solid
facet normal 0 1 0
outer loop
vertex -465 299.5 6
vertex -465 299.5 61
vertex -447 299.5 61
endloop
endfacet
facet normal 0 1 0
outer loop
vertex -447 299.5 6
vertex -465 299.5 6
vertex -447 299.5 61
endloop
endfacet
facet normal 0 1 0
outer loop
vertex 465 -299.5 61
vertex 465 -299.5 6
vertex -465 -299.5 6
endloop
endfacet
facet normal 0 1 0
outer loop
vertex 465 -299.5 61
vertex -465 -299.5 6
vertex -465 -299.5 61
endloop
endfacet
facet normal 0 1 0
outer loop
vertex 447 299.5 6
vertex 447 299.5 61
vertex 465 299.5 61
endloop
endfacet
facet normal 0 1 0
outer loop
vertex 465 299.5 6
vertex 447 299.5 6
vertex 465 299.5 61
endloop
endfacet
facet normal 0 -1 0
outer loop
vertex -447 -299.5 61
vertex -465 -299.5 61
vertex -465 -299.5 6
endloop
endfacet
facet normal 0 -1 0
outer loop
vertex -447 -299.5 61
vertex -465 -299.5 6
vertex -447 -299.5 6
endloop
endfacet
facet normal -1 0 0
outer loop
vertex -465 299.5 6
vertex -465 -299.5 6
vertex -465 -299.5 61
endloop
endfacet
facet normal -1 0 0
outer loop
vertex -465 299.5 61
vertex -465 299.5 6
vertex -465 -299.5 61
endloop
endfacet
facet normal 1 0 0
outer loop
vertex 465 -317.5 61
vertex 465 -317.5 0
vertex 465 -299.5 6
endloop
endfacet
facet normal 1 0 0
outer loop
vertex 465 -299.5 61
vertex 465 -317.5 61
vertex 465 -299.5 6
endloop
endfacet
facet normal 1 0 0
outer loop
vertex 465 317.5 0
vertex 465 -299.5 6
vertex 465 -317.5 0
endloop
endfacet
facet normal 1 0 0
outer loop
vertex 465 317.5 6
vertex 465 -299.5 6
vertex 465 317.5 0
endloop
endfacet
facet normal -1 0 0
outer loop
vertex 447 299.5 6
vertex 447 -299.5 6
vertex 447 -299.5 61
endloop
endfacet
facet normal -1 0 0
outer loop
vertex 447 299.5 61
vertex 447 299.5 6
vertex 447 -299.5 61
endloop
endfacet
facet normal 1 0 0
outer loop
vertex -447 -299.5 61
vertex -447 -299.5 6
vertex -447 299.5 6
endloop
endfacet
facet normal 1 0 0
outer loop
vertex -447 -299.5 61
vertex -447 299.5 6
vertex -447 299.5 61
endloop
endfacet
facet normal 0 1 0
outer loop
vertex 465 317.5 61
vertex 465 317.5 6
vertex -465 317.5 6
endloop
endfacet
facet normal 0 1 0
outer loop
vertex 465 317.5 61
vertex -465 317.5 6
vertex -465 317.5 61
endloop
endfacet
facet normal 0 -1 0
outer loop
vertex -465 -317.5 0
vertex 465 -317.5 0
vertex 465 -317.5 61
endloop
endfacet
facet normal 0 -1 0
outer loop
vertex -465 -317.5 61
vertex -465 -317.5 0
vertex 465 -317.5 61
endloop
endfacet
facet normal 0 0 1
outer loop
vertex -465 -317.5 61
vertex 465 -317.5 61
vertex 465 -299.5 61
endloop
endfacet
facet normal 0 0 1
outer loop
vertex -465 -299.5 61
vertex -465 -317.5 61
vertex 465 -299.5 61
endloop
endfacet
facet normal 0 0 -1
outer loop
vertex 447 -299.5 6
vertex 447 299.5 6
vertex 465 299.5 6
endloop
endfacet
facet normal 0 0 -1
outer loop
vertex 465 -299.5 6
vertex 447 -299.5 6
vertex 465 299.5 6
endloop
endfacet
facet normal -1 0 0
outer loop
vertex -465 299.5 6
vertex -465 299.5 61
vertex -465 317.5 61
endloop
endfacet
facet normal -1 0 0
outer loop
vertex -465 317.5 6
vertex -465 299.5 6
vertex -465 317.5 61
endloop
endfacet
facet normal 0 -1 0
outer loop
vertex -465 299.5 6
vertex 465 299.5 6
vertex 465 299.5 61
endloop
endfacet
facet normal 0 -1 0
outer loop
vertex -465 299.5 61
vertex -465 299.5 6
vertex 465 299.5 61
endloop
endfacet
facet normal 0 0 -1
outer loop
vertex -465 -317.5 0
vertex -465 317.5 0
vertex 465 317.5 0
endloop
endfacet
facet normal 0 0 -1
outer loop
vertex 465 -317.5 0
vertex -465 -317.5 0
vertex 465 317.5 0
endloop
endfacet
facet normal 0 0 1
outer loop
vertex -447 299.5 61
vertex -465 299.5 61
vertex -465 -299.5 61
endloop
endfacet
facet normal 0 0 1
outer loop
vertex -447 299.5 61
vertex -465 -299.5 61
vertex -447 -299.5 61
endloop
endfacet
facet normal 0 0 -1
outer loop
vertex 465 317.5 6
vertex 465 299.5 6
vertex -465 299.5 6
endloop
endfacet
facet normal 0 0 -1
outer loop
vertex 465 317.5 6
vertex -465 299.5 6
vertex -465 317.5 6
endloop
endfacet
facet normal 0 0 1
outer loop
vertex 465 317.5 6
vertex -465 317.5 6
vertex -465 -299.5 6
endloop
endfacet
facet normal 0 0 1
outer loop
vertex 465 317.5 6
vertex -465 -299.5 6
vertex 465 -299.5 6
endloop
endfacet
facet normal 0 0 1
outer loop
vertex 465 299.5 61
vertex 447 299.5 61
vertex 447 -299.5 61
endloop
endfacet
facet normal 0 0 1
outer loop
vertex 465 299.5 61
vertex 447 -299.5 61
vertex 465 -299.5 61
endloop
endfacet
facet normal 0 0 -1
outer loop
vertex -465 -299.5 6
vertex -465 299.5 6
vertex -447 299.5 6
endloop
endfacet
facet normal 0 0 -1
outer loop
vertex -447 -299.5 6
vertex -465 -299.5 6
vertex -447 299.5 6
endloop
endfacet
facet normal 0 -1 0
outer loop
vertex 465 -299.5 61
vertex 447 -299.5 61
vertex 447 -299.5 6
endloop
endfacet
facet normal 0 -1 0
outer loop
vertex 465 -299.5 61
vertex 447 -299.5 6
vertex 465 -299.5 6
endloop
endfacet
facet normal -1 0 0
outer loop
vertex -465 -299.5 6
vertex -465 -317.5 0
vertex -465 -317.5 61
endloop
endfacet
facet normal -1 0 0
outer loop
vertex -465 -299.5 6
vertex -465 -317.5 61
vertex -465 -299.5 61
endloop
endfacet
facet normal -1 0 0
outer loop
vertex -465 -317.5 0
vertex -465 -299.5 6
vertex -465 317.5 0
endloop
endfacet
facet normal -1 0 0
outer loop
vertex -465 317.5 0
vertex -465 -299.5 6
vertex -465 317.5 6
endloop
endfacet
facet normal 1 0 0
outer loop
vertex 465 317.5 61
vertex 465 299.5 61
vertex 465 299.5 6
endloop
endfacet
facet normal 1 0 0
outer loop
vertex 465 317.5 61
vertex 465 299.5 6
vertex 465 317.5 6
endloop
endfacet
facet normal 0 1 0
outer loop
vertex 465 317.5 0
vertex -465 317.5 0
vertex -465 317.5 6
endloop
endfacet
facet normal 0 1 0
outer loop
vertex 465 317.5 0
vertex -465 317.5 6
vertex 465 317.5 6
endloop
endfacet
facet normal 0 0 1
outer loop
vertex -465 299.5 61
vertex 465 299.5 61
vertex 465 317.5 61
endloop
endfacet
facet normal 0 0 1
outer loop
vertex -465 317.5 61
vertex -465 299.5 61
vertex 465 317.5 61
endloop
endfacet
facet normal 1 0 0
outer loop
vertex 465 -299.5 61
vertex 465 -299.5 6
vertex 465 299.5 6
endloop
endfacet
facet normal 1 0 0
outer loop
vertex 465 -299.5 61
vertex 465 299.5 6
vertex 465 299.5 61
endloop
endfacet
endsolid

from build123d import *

# Parameters (mm, degrees)
F0_W     = 930
F0_H     = 635
F1_DEPTH = 6
F2_W     = 18
F2_H     = 55
F3_DEPTH = 930
F4_W     = 18
F4_H     = 55
F5_DEPTH = 930
F6_W     = 18
F6_H     = 55
F7_DEPTH = 599
F8_W     = 18
F8_H     = 55
F9_DEPTH = 599


with BuildPart() as f1:
    # F0 (on Top) → F1 (new body)
    with BuildSketch(Plane.XY):
        Rectangle(F0_W, F0_H)
    extrude(amount=F1_DEPTH)

    # F2 (on face) → F3 (join)
    with BuildSketch(Plane.YZ.offset(465)):
        with Locations((-308.5, 33.5)):
            Rectangle(F2_W, F2_H)
    extrude(amount=-F3_DEPTH)


with BuildPart() as f5:
    # F4 (on face) → F5 (new body)
    with BuildSketch(Plane.YZ.offset(465)):
        with Locations((308.5, 33.5)):
            Rectangle(F4_W, F4_H)
    extrude(amount=-F5_DEPTH)


with BuildPart() as f7:
    # F6 (on face) → F7 (new body, through all)
    with BuildSketch(Plane.XZ.offset(-299.5)):
        with Locations((456, 33.5)):
            Rectangle(F6_W, F6_H)
    extrude(amount=F7_DEPTH)


with BuildPart() as f9:
    # F8 (on face) → F9 (new body, through all)
    with BuildSketch(Plane.XZ.offset(-299.5)):
        with Locations((-456, 33.5)):
            Rectangle(F8_W, F8_H)
    extrude(amount=F9_DEPTH)


solid = Compound([f1.part, f5.part, f7.part, f9.part])
